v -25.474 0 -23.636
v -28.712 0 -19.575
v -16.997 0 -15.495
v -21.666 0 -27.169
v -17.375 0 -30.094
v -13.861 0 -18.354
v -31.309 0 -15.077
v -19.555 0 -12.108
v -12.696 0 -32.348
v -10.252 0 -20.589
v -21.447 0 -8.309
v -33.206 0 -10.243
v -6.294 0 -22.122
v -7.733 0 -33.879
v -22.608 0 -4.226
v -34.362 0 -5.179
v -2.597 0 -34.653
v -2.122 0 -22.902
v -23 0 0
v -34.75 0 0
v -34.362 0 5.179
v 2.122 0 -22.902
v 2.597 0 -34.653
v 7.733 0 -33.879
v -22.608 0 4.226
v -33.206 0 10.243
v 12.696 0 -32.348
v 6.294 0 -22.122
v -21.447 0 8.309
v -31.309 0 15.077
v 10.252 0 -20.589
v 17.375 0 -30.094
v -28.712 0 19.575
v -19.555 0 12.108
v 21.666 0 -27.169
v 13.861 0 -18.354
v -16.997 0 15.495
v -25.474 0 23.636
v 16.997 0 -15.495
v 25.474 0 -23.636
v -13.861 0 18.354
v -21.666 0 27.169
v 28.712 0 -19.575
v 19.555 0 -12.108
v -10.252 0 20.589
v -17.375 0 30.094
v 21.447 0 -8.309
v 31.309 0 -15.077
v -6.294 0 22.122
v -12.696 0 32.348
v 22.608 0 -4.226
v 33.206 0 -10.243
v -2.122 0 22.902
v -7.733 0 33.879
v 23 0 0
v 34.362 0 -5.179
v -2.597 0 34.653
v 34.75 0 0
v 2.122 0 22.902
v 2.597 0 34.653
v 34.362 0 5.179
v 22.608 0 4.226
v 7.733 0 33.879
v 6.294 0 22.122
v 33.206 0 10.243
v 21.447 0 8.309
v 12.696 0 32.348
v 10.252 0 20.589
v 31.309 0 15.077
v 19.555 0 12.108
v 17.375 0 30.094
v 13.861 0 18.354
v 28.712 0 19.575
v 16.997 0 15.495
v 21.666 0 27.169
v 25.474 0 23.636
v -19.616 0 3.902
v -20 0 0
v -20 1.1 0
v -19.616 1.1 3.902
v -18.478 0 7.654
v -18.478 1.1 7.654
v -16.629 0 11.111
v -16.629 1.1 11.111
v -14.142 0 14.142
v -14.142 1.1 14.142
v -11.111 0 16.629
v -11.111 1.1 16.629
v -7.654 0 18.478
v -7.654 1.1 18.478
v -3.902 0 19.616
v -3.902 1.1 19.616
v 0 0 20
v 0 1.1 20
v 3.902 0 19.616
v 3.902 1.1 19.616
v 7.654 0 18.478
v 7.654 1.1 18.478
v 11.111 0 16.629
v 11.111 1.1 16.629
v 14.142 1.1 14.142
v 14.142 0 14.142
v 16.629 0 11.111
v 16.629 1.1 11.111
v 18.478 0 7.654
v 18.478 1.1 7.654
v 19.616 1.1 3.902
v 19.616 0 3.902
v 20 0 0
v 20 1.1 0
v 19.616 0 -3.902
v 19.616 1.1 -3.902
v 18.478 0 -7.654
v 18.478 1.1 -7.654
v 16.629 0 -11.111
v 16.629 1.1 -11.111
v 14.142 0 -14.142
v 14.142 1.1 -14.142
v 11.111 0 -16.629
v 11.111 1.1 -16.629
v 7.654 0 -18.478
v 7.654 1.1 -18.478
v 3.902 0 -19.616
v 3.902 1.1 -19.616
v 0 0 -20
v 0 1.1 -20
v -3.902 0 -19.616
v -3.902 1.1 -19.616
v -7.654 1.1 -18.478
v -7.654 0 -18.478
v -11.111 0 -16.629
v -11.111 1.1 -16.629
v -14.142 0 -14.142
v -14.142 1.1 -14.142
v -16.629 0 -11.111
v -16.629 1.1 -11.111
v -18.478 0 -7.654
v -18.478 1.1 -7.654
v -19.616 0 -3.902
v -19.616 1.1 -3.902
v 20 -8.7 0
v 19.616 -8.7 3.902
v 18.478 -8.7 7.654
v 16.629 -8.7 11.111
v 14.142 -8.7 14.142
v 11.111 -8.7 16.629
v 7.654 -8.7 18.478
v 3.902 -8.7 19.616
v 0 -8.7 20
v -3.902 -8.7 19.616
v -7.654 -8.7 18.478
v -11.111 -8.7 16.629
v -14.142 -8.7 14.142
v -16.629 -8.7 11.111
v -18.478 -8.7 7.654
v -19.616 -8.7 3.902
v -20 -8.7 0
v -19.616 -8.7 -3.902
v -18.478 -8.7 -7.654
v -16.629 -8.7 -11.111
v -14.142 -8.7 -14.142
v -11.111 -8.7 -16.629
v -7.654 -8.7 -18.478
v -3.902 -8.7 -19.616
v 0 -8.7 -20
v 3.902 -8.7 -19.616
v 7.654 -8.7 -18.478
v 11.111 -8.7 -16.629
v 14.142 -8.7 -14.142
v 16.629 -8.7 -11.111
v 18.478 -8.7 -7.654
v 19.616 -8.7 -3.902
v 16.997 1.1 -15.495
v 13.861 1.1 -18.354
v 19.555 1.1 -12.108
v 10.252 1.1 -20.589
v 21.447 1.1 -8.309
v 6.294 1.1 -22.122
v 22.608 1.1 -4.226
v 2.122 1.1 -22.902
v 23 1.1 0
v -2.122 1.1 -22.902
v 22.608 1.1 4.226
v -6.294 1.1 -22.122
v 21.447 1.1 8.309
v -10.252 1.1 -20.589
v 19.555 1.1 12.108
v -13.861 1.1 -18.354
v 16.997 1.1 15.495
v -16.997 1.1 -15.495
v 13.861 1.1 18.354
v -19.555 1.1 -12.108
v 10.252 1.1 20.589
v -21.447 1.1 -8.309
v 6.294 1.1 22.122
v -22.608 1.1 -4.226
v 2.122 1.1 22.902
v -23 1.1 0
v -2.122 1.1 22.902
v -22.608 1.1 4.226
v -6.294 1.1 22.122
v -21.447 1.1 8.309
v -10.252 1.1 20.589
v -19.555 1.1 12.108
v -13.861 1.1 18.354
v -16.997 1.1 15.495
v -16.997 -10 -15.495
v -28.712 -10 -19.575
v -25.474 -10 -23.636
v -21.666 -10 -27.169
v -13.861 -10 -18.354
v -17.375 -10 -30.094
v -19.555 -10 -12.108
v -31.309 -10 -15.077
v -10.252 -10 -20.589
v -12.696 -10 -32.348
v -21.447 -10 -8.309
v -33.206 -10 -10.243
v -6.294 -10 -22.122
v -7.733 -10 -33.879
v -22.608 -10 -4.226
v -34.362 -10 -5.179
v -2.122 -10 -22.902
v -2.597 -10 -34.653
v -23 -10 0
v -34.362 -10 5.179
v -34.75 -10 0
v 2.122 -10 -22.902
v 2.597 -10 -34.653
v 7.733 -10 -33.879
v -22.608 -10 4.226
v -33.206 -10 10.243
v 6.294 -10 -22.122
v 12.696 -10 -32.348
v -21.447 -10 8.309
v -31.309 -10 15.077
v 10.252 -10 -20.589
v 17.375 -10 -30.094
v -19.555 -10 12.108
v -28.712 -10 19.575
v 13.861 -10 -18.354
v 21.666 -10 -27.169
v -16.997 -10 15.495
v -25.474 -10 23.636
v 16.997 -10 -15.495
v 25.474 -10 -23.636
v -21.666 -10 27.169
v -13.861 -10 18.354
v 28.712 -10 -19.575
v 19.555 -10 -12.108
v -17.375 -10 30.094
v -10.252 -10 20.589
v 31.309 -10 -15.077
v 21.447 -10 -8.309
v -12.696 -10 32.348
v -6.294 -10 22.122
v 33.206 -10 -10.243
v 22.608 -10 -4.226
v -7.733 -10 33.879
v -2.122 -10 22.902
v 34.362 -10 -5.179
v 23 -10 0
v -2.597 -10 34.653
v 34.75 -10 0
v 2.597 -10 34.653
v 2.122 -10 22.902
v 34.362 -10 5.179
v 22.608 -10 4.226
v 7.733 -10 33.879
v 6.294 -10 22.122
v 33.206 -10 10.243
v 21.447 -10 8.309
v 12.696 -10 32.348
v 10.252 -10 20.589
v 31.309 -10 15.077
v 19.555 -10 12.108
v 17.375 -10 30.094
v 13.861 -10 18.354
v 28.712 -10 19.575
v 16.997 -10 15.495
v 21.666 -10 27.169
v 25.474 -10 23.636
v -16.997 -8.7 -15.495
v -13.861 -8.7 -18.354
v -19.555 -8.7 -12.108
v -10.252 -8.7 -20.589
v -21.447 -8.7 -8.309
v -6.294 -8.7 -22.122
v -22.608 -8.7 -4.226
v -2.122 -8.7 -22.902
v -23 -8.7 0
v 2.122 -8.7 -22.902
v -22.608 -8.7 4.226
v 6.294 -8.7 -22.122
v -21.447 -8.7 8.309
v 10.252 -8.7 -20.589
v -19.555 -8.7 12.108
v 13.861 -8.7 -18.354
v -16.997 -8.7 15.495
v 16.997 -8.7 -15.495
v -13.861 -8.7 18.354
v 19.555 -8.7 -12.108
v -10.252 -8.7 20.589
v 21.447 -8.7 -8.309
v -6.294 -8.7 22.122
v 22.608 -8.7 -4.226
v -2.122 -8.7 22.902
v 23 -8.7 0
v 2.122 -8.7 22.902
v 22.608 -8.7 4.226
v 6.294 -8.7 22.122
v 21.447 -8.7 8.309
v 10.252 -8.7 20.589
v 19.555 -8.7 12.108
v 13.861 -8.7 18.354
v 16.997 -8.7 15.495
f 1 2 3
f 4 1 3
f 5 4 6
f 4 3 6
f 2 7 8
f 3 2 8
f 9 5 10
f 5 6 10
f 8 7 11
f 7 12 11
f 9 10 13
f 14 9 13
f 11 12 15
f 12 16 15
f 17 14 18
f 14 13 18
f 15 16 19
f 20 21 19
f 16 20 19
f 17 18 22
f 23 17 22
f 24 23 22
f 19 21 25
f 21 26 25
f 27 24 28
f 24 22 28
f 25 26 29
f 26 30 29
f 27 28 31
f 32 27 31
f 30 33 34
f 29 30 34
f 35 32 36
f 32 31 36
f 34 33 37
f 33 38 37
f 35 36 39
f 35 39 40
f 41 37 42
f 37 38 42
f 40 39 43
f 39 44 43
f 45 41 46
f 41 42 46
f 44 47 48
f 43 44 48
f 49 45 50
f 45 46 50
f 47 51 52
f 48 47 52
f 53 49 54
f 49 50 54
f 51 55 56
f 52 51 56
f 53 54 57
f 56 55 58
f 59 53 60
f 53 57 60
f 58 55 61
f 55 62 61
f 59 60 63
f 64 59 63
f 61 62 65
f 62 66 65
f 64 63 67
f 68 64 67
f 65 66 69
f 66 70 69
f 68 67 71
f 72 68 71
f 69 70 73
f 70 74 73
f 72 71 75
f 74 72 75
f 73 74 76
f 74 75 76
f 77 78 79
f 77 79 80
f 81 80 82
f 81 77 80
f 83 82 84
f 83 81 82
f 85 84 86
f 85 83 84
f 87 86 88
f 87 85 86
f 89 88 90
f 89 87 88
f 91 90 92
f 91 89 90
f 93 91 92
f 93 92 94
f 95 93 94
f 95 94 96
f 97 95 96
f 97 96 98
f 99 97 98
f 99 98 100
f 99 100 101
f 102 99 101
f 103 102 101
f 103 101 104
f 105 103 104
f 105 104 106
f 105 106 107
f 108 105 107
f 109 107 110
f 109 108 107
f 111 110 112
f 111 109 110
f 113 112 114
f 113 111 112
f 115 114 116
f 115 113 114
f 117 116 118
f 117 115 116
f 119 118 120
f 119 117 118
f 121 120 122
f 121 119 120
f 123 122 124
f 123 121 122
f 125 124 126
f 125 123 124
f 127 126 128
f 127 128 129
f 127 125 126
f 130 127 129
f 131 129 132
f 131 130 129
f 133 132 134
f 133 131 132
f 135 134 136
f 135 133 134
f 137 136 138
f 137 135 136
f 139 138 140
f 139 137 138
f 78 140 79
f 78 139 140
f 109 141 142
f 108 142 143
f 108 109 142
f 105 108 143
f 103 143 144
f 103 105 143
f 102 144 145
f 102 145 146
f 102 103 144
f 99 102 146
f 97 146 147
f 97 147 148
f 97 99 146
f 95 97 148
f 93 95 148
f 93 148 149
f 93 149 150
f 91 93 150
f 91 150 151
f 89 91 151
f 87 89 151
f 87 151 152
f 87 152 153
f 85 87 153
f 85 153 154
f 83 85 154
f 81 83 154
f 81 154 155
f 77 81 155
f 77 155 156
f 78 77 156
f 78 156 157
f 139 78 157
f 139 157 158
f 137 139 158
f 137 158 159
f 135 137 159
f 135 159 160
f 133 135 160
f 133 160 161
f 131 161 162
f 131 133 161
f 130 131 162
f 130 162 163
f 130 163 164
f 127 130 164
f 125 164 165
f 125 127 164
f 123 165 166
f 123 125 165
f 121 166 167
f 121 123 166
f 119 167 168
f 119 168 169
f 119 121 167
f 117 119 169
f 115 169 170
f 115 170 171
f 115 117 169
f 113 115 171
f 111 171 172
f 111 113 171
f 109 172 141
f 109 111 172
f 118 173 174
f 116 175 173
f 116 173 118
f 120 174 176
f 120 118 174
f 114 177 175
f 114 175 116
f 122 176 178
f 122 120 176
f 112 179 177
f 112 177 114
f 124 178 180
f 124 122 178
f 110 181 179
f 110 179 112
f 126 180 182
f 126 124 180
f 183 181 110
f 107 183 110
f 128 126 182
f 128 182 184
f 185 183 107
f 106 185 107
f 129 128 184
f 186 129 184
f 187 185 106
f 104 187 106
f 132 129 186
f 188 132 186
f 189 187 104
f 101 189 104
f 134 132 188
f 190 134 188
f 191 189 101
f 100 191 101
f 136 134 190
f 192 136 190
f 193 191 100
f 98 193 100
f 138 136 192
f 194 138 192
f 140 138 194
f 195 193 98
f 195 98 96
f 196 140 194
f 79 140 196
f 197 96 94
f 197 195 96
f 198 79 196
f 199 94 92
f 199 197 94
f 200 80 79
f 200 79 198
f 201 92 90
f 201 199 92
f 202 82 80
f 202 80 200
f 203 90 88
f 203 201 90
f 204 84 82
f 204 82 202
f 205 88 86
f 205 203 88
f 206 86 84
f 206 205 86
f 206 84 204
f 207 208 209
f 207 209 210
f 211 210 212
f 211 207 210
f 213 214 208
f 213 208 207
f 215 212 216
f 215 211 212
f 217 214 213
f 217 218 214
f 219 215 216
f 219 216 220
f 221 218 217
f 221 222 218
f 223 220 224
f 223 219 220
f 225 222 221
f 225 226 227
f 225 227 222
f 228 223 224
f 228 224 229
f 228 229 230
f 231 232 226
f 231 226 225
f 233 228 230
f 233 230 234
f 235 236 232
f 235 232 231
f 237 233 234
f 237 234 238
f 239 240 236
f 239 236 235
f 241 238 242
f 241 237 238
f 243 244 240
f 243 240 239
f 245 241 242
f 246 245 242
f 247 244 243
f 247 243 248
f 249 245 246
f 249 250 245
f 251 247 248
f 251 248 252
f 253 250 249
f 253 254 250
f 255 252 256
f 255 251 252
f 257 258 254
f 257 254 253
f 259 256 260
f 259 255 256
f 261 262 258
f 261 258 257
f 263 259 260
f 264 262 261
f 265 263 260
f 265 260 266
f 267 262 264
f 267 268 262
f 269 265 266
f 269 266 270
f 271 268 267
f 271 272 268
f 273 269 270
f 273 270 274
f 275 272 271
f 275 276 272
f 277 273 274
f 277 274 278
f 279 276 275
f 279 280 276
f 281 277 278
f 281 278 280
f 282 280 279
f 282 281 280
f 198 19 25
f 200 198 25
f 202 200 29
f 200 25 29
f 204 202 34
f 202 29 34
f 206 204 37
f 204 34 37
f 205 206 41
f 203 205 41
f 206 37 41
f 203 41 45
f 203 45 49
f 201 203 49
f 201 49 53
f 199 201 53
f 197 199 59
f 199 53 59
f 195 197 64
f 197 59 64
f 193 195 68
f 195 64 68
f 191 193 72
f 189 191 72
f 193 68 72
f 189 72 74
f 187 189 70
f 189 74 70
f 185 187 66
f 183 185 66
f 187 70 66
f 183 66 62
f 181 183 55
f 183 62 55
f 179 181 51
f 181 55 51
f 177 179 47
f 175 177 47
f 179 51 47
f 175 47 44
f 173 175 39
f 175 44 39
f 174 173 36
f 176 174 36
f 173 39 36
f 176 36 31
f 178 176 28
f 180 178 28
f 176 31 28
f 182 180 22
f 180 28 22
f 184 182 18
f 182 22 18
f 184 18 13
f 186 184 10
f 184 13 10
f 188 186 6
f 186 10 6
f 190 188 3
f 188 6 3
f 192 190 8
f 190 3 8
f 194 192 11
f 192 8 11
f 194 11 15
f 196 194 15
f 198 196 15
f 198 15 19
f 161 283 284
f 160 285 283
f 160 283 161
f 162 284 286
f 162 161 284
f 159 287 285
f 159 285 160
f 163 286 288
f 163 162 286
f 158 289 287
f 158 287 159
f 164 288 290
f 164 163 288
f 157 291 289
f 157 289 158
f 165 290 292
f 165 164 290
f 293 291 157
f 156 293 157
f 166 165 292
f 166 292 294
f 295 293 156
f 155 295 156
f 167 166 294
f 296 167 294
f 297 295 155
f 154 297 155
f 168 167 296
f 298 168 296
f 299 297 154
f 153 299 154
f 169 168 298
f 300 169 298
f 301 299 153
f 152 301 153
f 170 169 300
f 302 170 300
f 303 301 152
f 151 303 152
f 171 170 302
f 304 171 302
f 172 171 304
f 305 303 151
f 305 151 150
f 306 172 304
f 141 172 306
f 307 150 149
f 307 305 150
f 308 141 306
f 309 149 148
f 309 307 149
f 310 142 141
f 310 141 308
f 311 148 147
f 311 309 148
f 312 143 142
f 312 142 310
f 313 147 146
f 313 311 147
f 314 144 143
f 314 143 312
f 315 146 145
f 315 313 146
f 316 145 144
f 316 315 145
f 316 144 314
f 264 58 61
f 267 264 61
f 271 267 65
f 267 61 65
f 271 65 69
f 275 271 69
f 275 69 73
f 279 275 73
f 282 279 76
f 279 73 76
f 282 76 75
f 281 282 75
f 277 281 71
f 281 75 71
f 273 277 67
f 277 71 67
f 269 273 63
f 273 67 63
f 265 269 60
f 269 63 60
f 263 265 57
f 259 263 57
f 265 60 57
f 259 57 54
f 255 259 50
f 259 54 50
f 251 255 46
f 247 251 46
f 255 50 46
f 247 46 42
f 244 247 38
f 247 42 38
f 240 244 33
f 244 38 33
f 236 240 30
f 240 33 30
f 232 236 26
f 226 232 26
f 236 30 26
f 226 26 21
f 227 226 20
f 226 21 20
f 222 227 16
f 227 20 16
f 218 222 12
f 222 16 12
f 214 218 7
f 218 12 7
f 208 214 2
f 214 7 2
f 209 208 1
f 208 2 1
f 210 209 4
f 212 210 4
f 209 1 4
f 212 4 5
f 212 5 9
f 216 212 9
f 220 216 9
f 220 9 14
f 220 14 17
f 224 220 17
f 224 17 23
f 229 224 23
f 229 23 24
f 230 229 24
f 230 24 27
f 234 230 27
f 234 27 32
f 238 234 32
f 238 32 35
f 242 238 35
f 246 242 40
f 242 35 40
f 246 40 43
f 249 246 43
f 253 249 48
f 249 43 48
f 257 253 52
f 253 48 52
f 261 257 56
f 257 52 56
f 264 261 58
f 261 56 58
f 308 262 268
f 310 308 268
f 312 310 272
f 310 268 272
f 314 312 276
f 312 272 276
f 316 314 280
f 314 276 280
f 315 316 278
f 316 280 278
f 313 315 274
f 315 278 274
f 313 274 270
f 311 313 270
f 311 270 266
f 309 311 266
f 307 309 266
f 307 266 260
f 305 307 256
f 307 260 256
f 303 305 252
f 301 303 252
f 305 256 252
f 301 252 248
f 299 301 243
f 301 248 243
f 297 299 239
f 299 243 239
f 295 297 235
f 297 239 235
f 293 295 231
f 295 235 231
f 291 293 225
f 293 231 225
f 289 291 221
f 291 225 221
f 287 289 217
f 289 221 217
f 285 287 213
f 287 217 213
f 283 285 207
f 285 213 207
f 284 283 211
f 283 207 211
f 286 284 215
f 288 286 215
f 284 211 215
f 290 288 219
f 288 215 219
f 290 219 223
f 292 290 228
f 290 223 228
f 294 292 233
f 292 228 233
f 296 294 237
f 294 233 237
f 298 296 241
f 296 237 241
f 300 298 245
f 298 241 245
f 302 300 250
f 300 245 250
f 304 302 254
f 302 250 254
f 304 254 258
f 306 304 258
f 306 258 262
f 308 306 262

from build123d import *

# Parameters (mm, degrees)
F0_R     = 34.75
F0_R_2   = 20
F1_DEPTH = 10
F2_R     = 23
F2_R_2   = 20
F3_DEPTH = 1.3
F4_R     = 23
F4_R_2   = 20
F5_DEPTH = 1.1


with BuildPart() as f1:
    # F0 (on Front) → F1 (new body)
    with BuildSketch(Plane.XZ):
        Circle(F0_R)
        Circle(F0_R_2, mode=Mode.SUBTRACT)
    extrude(amount=F1_DEPTH)

    # F2 (on face) → F3 (cut)
    with BuildSketch(Plane.XZ.offset(10)):
        Circle(F2_R)
        Circle(F2_R_2, mode=Mode.SUBTRACT)
    extrude(amount=-F3_DEPTH, mode=Mode.SUBTRACT)

    # F4 (on face) → F5 (join)
    with BuildSketch(Plane(origin=(0, 0, 0), x_dir=(-1, 0, 0), z_dir=(0, 1, 0))):
        Circle(F4_R)
        Circle(F4_R_2, mode=Mode.SUBTRACT)
    extrude(amount=F5_DEPTH)


solid = f1.part
